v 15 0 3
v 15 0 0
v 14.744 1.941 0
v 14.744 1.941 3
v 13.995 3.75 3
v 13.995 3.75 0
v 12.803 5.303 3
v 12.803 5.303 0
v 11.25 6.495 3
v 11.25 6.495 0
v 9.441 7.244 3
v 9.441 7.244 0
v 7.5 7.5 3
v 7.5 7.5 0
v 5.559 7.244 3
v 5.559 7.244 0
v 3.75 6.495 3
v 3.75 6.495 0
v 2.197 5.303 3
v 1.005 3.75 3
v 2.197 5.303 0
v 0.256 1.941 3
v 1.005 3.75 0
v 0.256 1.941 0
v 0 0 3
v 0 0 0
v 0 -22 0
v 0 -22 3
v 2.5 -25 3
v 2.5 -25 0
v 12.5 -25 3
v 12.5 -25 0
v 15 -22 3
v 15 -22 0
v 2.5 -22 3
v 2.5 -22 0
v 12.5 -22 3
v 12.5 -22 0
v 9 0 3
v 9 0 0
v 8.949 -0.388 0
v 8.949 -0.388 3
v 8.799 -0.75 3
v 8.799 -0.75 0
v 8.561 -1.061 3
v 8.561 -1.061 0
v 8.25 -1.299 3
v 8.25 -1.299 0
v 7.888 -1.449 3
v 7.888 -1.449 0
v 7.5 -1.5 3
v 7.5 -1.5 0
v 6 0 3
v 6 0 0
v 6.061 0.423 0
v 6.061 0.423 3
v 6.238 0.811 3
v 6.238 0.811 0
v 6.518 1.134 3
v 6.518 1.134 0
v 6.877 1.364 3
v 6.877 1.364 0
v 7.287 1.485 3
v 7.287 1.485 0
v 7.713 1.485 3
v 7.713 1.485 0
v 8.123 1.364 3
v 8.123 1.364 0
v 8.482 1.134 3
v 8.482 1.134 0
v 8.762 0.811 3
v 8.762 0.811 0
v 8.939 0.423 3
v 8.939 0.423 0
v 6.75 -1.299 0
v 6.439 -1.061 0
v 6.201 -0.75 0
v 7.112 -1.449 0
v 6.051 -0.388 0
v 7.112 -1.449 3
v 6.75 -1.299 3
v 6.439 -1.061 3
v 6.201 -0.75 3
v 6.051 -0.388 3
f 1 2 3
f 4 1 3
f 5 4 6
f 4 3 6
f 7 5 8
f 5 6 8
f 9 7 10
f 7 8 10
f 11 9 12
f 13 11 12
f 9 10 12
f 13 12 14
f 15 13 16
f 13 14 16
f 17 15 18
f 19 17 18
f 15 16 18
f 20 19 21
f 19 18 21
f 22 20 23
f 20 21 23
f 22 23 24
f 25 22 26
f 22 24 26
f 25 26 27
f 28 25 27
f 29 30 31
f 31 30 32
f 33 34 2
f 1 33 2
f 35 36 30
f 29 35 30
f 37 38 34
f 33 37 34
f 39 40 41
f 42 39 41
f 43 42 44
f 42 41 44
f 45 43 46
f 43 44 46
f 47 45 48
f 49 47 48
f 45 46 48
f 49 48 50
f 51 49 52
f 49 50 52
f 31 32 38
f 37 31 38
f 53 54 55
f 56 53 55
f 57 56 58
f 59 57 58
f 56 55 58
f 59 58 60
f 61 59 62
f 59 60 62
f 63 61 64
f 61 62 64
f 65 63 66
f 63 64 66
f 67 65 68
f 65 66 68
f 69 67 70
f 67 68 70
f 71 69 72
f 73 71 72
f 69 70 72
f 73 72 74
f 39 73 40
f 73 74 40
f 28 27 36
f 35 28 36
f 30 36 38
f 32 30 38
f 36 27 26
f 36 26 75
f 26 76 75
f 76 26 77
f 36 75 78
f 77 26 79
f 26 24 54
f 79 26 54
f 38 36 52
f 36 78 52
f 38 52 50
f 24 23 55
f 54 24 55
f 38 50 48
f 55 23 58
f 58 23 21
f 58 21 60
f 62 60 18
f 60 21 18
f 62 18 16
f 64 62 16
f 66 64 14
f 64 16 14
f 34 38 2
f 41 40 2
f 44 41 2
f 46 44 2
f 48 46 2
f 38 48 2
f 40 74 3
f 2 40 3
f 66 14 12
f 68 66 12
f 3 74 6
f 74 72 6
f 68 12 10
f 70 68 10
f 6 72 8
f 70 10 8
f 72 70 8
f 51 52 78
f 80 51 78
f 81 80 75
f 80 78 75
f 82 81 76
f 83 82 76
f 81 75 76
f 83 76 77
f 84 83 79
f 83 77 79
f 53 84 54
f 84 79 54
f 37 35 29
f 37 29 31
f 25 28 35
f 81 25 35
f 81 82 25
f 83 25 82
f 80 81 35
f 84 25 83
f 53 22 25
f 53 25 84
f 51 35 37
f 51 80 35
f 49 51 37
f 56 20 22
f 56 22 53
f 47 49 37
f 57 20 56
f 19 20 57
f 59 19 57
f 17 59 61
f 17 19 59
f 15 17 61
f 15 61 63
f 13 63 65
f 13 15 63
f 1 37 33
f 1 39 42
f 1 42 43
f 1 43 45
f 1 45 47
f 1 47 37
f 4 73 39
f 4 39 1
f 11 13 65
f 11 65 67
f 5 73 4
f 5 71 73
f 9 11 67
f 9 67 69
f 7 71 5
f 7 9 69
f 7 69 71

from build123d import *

# Parameters (mm, degrees)
EXTRUDE_1_DEPTH = 3


with BuildPart() as part:
    # 草图1 → 凸台-拉伸1 (new body)
    with BuildSketch(Plane.XY):
        with BuildLine():
            ThreePointArc((6, 0), (7.5, 1.5), (9, 0))
            Line((9, 0), (15, 0))
            ThreePointArc((15, 0), (7.5, 7.5), (0, 0))
            Line((0, 0), (6, 0))
        make_face()
        with BuildLine():
            ThreePointArc((9, 0), (8.560660172, -1.060660172), (7.5, -1.5))
            Line((7.5, -1.5), (7.5, -7.5))
            ThreePointArc((7.5, -7.5), (12.803300859, -5.303300859), (15, 0))
            Line((15, 0), (9, 0))
        make_face()
        with BuildLine():
            Line((7.5, -7.5), (7.5, -1.5))
            ThreePointArc((7.5, -1.5), (6.439339828, -1.060660172), (6, 0))
            Line((6, 0), (0, 0))
            ThreePointArc((0, 0), (2.196699141, -5.303300859), (7.5, -7.5))
        make_face()
        with BuildLine():
            ThreePointArc((15, 0), (12.803300859, -5.303300859), (7.5, -7.5))
            Line((7.5, -7.5), (7.5, -22))
            Line((7.5, -22), (12.5, -22))
            Line((12.5, -22), (15, -22))
            Line((15, -22), (15, 0))
        make_face()
        with BuildLine():
            Line((7.5, -22), (7.5, -7.5))
            ThreePointArc((7.5, -7.5), (2.196699141, -5.303300859), (0, 0))
            Line((0, 0), (0, -22))
            Line((0, -22), (2.5, -22))
            Line((2.5, -22), (7.5, -22))
        make_face()
        Polygon((12.5, -22), (7.5, -22), (2.5, -22), (2.5, -25), (12.5, -25), align=None)
    extrude(amount=EXTRUDE_1_DEPTH)


solid = part.part
